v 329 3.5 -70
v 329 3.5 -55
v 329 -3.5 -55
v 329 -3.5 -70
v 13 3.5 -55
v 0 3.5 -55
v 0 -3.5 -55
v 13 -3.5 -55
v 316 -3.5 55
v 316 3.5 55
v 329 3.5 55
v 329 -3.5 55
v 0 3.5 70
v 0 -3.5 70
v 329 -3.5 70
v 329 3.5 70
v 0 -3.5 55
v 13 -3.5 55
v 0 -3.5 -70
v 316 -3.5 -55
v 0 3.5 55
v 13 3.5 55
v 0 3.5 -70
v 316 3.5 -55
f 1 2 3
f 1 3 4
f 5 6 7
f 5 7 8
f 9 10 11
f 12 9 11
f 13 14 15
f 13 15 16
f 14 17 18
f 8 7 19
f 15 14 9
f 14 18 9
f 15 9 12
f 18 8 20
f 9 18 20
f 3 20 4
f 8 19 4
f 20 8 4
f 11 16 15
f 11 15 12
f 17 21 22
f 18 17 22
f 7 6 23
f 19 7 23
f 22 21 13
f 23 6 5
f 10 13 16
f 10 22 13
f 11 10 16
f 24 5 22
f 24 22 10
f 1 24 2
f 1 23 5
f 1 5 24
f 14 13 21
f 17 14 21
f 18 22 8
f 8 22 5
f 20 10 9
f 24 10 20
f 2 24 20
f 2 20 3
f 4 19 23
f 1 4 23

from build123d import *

# Parameters (mm, degrees)
ESQUISSE1_W             = 140
ESQUISSE1_H             = 7
BOSS_EXTRU_1_DEPTH      = 329
ESQUISSE2_W             = 303
ESQUISSE2_H             = 244.18
BOSS_EXTRU_2_DEPTH      = 7
ESQUISSE3_W             = 13
ESQUISSE3_H             = 110
ENL_V_MAT_EXTRU_1_DEPTH = 96
ENL_V_MAT_EXTRU_2_DEPTH = 96


with BuildPart() as part:
    # Esquisse1 → Boss.-Extru.1 (new body)
    with BuildSketch(Plane(origin=(0, 0, 0), x_dir=(0, 0, -1), z_dir=(1, 0, 0))):
        Rectangle(ESQUISSE1_W, ESQUISSE1_H)
    extrude(amount=BOSS_EXTRU_1_DEPTH)

    # Esquisse2 → Boss.-Extru.2 (add)
    with BuildSketch(Plane(origin=(0, 3.5, 0), x_dir=(1, 0, 0), z_dir=(0, 1, 0))):
        with Locations((164.5, 0)):
            Rectangle(ESQUISSE2_W, ESQUISSE2_H)
    extrude(amount=-BOSS_EXTRU_2_DEPTH)

    # Esquisse3 → Enlèv. mat.-Extru.1 (cut)
    with BuildSketch(Plane(origin=(0, 3.5, 0), x_dir=(1, 0, 0), z_dir=(0, 1, 0))):
        with Locations((6.5, 0)):
            Rectangle(ESQUISSE3_W, ESQUISSE3_H)
        with Locations((322.5, 0)):
            Rectangle(ESQUISSE3_W, ESQUISSE3_H)
    extrude(amount=-ENL_V_MAT_EXTRU_1_DEPTH, mode=Mode.SUBTRACT)

    # Esquisse4 → Enlèv. mat.-Extru.2 (cut)
    with BuildSketch(Plane(origin=(0, 3.5, 0), x_dir=(1, 0, 0), z_dir=(0, 1, 0))):
        Polygon((13, 70), (316, 70), (318.765325252, 132.447128924), (0, 132.447128924), align=None)
        Polygon((13, -70), (316, -70), (321.257609936, -130.666925578), (0, -142.41626766), align=None)
    extrude(amount=-ENL_V_MAT_EXTRU_2_DEPTH, mode=Mode.SUBTRACT)


solid = part.part
